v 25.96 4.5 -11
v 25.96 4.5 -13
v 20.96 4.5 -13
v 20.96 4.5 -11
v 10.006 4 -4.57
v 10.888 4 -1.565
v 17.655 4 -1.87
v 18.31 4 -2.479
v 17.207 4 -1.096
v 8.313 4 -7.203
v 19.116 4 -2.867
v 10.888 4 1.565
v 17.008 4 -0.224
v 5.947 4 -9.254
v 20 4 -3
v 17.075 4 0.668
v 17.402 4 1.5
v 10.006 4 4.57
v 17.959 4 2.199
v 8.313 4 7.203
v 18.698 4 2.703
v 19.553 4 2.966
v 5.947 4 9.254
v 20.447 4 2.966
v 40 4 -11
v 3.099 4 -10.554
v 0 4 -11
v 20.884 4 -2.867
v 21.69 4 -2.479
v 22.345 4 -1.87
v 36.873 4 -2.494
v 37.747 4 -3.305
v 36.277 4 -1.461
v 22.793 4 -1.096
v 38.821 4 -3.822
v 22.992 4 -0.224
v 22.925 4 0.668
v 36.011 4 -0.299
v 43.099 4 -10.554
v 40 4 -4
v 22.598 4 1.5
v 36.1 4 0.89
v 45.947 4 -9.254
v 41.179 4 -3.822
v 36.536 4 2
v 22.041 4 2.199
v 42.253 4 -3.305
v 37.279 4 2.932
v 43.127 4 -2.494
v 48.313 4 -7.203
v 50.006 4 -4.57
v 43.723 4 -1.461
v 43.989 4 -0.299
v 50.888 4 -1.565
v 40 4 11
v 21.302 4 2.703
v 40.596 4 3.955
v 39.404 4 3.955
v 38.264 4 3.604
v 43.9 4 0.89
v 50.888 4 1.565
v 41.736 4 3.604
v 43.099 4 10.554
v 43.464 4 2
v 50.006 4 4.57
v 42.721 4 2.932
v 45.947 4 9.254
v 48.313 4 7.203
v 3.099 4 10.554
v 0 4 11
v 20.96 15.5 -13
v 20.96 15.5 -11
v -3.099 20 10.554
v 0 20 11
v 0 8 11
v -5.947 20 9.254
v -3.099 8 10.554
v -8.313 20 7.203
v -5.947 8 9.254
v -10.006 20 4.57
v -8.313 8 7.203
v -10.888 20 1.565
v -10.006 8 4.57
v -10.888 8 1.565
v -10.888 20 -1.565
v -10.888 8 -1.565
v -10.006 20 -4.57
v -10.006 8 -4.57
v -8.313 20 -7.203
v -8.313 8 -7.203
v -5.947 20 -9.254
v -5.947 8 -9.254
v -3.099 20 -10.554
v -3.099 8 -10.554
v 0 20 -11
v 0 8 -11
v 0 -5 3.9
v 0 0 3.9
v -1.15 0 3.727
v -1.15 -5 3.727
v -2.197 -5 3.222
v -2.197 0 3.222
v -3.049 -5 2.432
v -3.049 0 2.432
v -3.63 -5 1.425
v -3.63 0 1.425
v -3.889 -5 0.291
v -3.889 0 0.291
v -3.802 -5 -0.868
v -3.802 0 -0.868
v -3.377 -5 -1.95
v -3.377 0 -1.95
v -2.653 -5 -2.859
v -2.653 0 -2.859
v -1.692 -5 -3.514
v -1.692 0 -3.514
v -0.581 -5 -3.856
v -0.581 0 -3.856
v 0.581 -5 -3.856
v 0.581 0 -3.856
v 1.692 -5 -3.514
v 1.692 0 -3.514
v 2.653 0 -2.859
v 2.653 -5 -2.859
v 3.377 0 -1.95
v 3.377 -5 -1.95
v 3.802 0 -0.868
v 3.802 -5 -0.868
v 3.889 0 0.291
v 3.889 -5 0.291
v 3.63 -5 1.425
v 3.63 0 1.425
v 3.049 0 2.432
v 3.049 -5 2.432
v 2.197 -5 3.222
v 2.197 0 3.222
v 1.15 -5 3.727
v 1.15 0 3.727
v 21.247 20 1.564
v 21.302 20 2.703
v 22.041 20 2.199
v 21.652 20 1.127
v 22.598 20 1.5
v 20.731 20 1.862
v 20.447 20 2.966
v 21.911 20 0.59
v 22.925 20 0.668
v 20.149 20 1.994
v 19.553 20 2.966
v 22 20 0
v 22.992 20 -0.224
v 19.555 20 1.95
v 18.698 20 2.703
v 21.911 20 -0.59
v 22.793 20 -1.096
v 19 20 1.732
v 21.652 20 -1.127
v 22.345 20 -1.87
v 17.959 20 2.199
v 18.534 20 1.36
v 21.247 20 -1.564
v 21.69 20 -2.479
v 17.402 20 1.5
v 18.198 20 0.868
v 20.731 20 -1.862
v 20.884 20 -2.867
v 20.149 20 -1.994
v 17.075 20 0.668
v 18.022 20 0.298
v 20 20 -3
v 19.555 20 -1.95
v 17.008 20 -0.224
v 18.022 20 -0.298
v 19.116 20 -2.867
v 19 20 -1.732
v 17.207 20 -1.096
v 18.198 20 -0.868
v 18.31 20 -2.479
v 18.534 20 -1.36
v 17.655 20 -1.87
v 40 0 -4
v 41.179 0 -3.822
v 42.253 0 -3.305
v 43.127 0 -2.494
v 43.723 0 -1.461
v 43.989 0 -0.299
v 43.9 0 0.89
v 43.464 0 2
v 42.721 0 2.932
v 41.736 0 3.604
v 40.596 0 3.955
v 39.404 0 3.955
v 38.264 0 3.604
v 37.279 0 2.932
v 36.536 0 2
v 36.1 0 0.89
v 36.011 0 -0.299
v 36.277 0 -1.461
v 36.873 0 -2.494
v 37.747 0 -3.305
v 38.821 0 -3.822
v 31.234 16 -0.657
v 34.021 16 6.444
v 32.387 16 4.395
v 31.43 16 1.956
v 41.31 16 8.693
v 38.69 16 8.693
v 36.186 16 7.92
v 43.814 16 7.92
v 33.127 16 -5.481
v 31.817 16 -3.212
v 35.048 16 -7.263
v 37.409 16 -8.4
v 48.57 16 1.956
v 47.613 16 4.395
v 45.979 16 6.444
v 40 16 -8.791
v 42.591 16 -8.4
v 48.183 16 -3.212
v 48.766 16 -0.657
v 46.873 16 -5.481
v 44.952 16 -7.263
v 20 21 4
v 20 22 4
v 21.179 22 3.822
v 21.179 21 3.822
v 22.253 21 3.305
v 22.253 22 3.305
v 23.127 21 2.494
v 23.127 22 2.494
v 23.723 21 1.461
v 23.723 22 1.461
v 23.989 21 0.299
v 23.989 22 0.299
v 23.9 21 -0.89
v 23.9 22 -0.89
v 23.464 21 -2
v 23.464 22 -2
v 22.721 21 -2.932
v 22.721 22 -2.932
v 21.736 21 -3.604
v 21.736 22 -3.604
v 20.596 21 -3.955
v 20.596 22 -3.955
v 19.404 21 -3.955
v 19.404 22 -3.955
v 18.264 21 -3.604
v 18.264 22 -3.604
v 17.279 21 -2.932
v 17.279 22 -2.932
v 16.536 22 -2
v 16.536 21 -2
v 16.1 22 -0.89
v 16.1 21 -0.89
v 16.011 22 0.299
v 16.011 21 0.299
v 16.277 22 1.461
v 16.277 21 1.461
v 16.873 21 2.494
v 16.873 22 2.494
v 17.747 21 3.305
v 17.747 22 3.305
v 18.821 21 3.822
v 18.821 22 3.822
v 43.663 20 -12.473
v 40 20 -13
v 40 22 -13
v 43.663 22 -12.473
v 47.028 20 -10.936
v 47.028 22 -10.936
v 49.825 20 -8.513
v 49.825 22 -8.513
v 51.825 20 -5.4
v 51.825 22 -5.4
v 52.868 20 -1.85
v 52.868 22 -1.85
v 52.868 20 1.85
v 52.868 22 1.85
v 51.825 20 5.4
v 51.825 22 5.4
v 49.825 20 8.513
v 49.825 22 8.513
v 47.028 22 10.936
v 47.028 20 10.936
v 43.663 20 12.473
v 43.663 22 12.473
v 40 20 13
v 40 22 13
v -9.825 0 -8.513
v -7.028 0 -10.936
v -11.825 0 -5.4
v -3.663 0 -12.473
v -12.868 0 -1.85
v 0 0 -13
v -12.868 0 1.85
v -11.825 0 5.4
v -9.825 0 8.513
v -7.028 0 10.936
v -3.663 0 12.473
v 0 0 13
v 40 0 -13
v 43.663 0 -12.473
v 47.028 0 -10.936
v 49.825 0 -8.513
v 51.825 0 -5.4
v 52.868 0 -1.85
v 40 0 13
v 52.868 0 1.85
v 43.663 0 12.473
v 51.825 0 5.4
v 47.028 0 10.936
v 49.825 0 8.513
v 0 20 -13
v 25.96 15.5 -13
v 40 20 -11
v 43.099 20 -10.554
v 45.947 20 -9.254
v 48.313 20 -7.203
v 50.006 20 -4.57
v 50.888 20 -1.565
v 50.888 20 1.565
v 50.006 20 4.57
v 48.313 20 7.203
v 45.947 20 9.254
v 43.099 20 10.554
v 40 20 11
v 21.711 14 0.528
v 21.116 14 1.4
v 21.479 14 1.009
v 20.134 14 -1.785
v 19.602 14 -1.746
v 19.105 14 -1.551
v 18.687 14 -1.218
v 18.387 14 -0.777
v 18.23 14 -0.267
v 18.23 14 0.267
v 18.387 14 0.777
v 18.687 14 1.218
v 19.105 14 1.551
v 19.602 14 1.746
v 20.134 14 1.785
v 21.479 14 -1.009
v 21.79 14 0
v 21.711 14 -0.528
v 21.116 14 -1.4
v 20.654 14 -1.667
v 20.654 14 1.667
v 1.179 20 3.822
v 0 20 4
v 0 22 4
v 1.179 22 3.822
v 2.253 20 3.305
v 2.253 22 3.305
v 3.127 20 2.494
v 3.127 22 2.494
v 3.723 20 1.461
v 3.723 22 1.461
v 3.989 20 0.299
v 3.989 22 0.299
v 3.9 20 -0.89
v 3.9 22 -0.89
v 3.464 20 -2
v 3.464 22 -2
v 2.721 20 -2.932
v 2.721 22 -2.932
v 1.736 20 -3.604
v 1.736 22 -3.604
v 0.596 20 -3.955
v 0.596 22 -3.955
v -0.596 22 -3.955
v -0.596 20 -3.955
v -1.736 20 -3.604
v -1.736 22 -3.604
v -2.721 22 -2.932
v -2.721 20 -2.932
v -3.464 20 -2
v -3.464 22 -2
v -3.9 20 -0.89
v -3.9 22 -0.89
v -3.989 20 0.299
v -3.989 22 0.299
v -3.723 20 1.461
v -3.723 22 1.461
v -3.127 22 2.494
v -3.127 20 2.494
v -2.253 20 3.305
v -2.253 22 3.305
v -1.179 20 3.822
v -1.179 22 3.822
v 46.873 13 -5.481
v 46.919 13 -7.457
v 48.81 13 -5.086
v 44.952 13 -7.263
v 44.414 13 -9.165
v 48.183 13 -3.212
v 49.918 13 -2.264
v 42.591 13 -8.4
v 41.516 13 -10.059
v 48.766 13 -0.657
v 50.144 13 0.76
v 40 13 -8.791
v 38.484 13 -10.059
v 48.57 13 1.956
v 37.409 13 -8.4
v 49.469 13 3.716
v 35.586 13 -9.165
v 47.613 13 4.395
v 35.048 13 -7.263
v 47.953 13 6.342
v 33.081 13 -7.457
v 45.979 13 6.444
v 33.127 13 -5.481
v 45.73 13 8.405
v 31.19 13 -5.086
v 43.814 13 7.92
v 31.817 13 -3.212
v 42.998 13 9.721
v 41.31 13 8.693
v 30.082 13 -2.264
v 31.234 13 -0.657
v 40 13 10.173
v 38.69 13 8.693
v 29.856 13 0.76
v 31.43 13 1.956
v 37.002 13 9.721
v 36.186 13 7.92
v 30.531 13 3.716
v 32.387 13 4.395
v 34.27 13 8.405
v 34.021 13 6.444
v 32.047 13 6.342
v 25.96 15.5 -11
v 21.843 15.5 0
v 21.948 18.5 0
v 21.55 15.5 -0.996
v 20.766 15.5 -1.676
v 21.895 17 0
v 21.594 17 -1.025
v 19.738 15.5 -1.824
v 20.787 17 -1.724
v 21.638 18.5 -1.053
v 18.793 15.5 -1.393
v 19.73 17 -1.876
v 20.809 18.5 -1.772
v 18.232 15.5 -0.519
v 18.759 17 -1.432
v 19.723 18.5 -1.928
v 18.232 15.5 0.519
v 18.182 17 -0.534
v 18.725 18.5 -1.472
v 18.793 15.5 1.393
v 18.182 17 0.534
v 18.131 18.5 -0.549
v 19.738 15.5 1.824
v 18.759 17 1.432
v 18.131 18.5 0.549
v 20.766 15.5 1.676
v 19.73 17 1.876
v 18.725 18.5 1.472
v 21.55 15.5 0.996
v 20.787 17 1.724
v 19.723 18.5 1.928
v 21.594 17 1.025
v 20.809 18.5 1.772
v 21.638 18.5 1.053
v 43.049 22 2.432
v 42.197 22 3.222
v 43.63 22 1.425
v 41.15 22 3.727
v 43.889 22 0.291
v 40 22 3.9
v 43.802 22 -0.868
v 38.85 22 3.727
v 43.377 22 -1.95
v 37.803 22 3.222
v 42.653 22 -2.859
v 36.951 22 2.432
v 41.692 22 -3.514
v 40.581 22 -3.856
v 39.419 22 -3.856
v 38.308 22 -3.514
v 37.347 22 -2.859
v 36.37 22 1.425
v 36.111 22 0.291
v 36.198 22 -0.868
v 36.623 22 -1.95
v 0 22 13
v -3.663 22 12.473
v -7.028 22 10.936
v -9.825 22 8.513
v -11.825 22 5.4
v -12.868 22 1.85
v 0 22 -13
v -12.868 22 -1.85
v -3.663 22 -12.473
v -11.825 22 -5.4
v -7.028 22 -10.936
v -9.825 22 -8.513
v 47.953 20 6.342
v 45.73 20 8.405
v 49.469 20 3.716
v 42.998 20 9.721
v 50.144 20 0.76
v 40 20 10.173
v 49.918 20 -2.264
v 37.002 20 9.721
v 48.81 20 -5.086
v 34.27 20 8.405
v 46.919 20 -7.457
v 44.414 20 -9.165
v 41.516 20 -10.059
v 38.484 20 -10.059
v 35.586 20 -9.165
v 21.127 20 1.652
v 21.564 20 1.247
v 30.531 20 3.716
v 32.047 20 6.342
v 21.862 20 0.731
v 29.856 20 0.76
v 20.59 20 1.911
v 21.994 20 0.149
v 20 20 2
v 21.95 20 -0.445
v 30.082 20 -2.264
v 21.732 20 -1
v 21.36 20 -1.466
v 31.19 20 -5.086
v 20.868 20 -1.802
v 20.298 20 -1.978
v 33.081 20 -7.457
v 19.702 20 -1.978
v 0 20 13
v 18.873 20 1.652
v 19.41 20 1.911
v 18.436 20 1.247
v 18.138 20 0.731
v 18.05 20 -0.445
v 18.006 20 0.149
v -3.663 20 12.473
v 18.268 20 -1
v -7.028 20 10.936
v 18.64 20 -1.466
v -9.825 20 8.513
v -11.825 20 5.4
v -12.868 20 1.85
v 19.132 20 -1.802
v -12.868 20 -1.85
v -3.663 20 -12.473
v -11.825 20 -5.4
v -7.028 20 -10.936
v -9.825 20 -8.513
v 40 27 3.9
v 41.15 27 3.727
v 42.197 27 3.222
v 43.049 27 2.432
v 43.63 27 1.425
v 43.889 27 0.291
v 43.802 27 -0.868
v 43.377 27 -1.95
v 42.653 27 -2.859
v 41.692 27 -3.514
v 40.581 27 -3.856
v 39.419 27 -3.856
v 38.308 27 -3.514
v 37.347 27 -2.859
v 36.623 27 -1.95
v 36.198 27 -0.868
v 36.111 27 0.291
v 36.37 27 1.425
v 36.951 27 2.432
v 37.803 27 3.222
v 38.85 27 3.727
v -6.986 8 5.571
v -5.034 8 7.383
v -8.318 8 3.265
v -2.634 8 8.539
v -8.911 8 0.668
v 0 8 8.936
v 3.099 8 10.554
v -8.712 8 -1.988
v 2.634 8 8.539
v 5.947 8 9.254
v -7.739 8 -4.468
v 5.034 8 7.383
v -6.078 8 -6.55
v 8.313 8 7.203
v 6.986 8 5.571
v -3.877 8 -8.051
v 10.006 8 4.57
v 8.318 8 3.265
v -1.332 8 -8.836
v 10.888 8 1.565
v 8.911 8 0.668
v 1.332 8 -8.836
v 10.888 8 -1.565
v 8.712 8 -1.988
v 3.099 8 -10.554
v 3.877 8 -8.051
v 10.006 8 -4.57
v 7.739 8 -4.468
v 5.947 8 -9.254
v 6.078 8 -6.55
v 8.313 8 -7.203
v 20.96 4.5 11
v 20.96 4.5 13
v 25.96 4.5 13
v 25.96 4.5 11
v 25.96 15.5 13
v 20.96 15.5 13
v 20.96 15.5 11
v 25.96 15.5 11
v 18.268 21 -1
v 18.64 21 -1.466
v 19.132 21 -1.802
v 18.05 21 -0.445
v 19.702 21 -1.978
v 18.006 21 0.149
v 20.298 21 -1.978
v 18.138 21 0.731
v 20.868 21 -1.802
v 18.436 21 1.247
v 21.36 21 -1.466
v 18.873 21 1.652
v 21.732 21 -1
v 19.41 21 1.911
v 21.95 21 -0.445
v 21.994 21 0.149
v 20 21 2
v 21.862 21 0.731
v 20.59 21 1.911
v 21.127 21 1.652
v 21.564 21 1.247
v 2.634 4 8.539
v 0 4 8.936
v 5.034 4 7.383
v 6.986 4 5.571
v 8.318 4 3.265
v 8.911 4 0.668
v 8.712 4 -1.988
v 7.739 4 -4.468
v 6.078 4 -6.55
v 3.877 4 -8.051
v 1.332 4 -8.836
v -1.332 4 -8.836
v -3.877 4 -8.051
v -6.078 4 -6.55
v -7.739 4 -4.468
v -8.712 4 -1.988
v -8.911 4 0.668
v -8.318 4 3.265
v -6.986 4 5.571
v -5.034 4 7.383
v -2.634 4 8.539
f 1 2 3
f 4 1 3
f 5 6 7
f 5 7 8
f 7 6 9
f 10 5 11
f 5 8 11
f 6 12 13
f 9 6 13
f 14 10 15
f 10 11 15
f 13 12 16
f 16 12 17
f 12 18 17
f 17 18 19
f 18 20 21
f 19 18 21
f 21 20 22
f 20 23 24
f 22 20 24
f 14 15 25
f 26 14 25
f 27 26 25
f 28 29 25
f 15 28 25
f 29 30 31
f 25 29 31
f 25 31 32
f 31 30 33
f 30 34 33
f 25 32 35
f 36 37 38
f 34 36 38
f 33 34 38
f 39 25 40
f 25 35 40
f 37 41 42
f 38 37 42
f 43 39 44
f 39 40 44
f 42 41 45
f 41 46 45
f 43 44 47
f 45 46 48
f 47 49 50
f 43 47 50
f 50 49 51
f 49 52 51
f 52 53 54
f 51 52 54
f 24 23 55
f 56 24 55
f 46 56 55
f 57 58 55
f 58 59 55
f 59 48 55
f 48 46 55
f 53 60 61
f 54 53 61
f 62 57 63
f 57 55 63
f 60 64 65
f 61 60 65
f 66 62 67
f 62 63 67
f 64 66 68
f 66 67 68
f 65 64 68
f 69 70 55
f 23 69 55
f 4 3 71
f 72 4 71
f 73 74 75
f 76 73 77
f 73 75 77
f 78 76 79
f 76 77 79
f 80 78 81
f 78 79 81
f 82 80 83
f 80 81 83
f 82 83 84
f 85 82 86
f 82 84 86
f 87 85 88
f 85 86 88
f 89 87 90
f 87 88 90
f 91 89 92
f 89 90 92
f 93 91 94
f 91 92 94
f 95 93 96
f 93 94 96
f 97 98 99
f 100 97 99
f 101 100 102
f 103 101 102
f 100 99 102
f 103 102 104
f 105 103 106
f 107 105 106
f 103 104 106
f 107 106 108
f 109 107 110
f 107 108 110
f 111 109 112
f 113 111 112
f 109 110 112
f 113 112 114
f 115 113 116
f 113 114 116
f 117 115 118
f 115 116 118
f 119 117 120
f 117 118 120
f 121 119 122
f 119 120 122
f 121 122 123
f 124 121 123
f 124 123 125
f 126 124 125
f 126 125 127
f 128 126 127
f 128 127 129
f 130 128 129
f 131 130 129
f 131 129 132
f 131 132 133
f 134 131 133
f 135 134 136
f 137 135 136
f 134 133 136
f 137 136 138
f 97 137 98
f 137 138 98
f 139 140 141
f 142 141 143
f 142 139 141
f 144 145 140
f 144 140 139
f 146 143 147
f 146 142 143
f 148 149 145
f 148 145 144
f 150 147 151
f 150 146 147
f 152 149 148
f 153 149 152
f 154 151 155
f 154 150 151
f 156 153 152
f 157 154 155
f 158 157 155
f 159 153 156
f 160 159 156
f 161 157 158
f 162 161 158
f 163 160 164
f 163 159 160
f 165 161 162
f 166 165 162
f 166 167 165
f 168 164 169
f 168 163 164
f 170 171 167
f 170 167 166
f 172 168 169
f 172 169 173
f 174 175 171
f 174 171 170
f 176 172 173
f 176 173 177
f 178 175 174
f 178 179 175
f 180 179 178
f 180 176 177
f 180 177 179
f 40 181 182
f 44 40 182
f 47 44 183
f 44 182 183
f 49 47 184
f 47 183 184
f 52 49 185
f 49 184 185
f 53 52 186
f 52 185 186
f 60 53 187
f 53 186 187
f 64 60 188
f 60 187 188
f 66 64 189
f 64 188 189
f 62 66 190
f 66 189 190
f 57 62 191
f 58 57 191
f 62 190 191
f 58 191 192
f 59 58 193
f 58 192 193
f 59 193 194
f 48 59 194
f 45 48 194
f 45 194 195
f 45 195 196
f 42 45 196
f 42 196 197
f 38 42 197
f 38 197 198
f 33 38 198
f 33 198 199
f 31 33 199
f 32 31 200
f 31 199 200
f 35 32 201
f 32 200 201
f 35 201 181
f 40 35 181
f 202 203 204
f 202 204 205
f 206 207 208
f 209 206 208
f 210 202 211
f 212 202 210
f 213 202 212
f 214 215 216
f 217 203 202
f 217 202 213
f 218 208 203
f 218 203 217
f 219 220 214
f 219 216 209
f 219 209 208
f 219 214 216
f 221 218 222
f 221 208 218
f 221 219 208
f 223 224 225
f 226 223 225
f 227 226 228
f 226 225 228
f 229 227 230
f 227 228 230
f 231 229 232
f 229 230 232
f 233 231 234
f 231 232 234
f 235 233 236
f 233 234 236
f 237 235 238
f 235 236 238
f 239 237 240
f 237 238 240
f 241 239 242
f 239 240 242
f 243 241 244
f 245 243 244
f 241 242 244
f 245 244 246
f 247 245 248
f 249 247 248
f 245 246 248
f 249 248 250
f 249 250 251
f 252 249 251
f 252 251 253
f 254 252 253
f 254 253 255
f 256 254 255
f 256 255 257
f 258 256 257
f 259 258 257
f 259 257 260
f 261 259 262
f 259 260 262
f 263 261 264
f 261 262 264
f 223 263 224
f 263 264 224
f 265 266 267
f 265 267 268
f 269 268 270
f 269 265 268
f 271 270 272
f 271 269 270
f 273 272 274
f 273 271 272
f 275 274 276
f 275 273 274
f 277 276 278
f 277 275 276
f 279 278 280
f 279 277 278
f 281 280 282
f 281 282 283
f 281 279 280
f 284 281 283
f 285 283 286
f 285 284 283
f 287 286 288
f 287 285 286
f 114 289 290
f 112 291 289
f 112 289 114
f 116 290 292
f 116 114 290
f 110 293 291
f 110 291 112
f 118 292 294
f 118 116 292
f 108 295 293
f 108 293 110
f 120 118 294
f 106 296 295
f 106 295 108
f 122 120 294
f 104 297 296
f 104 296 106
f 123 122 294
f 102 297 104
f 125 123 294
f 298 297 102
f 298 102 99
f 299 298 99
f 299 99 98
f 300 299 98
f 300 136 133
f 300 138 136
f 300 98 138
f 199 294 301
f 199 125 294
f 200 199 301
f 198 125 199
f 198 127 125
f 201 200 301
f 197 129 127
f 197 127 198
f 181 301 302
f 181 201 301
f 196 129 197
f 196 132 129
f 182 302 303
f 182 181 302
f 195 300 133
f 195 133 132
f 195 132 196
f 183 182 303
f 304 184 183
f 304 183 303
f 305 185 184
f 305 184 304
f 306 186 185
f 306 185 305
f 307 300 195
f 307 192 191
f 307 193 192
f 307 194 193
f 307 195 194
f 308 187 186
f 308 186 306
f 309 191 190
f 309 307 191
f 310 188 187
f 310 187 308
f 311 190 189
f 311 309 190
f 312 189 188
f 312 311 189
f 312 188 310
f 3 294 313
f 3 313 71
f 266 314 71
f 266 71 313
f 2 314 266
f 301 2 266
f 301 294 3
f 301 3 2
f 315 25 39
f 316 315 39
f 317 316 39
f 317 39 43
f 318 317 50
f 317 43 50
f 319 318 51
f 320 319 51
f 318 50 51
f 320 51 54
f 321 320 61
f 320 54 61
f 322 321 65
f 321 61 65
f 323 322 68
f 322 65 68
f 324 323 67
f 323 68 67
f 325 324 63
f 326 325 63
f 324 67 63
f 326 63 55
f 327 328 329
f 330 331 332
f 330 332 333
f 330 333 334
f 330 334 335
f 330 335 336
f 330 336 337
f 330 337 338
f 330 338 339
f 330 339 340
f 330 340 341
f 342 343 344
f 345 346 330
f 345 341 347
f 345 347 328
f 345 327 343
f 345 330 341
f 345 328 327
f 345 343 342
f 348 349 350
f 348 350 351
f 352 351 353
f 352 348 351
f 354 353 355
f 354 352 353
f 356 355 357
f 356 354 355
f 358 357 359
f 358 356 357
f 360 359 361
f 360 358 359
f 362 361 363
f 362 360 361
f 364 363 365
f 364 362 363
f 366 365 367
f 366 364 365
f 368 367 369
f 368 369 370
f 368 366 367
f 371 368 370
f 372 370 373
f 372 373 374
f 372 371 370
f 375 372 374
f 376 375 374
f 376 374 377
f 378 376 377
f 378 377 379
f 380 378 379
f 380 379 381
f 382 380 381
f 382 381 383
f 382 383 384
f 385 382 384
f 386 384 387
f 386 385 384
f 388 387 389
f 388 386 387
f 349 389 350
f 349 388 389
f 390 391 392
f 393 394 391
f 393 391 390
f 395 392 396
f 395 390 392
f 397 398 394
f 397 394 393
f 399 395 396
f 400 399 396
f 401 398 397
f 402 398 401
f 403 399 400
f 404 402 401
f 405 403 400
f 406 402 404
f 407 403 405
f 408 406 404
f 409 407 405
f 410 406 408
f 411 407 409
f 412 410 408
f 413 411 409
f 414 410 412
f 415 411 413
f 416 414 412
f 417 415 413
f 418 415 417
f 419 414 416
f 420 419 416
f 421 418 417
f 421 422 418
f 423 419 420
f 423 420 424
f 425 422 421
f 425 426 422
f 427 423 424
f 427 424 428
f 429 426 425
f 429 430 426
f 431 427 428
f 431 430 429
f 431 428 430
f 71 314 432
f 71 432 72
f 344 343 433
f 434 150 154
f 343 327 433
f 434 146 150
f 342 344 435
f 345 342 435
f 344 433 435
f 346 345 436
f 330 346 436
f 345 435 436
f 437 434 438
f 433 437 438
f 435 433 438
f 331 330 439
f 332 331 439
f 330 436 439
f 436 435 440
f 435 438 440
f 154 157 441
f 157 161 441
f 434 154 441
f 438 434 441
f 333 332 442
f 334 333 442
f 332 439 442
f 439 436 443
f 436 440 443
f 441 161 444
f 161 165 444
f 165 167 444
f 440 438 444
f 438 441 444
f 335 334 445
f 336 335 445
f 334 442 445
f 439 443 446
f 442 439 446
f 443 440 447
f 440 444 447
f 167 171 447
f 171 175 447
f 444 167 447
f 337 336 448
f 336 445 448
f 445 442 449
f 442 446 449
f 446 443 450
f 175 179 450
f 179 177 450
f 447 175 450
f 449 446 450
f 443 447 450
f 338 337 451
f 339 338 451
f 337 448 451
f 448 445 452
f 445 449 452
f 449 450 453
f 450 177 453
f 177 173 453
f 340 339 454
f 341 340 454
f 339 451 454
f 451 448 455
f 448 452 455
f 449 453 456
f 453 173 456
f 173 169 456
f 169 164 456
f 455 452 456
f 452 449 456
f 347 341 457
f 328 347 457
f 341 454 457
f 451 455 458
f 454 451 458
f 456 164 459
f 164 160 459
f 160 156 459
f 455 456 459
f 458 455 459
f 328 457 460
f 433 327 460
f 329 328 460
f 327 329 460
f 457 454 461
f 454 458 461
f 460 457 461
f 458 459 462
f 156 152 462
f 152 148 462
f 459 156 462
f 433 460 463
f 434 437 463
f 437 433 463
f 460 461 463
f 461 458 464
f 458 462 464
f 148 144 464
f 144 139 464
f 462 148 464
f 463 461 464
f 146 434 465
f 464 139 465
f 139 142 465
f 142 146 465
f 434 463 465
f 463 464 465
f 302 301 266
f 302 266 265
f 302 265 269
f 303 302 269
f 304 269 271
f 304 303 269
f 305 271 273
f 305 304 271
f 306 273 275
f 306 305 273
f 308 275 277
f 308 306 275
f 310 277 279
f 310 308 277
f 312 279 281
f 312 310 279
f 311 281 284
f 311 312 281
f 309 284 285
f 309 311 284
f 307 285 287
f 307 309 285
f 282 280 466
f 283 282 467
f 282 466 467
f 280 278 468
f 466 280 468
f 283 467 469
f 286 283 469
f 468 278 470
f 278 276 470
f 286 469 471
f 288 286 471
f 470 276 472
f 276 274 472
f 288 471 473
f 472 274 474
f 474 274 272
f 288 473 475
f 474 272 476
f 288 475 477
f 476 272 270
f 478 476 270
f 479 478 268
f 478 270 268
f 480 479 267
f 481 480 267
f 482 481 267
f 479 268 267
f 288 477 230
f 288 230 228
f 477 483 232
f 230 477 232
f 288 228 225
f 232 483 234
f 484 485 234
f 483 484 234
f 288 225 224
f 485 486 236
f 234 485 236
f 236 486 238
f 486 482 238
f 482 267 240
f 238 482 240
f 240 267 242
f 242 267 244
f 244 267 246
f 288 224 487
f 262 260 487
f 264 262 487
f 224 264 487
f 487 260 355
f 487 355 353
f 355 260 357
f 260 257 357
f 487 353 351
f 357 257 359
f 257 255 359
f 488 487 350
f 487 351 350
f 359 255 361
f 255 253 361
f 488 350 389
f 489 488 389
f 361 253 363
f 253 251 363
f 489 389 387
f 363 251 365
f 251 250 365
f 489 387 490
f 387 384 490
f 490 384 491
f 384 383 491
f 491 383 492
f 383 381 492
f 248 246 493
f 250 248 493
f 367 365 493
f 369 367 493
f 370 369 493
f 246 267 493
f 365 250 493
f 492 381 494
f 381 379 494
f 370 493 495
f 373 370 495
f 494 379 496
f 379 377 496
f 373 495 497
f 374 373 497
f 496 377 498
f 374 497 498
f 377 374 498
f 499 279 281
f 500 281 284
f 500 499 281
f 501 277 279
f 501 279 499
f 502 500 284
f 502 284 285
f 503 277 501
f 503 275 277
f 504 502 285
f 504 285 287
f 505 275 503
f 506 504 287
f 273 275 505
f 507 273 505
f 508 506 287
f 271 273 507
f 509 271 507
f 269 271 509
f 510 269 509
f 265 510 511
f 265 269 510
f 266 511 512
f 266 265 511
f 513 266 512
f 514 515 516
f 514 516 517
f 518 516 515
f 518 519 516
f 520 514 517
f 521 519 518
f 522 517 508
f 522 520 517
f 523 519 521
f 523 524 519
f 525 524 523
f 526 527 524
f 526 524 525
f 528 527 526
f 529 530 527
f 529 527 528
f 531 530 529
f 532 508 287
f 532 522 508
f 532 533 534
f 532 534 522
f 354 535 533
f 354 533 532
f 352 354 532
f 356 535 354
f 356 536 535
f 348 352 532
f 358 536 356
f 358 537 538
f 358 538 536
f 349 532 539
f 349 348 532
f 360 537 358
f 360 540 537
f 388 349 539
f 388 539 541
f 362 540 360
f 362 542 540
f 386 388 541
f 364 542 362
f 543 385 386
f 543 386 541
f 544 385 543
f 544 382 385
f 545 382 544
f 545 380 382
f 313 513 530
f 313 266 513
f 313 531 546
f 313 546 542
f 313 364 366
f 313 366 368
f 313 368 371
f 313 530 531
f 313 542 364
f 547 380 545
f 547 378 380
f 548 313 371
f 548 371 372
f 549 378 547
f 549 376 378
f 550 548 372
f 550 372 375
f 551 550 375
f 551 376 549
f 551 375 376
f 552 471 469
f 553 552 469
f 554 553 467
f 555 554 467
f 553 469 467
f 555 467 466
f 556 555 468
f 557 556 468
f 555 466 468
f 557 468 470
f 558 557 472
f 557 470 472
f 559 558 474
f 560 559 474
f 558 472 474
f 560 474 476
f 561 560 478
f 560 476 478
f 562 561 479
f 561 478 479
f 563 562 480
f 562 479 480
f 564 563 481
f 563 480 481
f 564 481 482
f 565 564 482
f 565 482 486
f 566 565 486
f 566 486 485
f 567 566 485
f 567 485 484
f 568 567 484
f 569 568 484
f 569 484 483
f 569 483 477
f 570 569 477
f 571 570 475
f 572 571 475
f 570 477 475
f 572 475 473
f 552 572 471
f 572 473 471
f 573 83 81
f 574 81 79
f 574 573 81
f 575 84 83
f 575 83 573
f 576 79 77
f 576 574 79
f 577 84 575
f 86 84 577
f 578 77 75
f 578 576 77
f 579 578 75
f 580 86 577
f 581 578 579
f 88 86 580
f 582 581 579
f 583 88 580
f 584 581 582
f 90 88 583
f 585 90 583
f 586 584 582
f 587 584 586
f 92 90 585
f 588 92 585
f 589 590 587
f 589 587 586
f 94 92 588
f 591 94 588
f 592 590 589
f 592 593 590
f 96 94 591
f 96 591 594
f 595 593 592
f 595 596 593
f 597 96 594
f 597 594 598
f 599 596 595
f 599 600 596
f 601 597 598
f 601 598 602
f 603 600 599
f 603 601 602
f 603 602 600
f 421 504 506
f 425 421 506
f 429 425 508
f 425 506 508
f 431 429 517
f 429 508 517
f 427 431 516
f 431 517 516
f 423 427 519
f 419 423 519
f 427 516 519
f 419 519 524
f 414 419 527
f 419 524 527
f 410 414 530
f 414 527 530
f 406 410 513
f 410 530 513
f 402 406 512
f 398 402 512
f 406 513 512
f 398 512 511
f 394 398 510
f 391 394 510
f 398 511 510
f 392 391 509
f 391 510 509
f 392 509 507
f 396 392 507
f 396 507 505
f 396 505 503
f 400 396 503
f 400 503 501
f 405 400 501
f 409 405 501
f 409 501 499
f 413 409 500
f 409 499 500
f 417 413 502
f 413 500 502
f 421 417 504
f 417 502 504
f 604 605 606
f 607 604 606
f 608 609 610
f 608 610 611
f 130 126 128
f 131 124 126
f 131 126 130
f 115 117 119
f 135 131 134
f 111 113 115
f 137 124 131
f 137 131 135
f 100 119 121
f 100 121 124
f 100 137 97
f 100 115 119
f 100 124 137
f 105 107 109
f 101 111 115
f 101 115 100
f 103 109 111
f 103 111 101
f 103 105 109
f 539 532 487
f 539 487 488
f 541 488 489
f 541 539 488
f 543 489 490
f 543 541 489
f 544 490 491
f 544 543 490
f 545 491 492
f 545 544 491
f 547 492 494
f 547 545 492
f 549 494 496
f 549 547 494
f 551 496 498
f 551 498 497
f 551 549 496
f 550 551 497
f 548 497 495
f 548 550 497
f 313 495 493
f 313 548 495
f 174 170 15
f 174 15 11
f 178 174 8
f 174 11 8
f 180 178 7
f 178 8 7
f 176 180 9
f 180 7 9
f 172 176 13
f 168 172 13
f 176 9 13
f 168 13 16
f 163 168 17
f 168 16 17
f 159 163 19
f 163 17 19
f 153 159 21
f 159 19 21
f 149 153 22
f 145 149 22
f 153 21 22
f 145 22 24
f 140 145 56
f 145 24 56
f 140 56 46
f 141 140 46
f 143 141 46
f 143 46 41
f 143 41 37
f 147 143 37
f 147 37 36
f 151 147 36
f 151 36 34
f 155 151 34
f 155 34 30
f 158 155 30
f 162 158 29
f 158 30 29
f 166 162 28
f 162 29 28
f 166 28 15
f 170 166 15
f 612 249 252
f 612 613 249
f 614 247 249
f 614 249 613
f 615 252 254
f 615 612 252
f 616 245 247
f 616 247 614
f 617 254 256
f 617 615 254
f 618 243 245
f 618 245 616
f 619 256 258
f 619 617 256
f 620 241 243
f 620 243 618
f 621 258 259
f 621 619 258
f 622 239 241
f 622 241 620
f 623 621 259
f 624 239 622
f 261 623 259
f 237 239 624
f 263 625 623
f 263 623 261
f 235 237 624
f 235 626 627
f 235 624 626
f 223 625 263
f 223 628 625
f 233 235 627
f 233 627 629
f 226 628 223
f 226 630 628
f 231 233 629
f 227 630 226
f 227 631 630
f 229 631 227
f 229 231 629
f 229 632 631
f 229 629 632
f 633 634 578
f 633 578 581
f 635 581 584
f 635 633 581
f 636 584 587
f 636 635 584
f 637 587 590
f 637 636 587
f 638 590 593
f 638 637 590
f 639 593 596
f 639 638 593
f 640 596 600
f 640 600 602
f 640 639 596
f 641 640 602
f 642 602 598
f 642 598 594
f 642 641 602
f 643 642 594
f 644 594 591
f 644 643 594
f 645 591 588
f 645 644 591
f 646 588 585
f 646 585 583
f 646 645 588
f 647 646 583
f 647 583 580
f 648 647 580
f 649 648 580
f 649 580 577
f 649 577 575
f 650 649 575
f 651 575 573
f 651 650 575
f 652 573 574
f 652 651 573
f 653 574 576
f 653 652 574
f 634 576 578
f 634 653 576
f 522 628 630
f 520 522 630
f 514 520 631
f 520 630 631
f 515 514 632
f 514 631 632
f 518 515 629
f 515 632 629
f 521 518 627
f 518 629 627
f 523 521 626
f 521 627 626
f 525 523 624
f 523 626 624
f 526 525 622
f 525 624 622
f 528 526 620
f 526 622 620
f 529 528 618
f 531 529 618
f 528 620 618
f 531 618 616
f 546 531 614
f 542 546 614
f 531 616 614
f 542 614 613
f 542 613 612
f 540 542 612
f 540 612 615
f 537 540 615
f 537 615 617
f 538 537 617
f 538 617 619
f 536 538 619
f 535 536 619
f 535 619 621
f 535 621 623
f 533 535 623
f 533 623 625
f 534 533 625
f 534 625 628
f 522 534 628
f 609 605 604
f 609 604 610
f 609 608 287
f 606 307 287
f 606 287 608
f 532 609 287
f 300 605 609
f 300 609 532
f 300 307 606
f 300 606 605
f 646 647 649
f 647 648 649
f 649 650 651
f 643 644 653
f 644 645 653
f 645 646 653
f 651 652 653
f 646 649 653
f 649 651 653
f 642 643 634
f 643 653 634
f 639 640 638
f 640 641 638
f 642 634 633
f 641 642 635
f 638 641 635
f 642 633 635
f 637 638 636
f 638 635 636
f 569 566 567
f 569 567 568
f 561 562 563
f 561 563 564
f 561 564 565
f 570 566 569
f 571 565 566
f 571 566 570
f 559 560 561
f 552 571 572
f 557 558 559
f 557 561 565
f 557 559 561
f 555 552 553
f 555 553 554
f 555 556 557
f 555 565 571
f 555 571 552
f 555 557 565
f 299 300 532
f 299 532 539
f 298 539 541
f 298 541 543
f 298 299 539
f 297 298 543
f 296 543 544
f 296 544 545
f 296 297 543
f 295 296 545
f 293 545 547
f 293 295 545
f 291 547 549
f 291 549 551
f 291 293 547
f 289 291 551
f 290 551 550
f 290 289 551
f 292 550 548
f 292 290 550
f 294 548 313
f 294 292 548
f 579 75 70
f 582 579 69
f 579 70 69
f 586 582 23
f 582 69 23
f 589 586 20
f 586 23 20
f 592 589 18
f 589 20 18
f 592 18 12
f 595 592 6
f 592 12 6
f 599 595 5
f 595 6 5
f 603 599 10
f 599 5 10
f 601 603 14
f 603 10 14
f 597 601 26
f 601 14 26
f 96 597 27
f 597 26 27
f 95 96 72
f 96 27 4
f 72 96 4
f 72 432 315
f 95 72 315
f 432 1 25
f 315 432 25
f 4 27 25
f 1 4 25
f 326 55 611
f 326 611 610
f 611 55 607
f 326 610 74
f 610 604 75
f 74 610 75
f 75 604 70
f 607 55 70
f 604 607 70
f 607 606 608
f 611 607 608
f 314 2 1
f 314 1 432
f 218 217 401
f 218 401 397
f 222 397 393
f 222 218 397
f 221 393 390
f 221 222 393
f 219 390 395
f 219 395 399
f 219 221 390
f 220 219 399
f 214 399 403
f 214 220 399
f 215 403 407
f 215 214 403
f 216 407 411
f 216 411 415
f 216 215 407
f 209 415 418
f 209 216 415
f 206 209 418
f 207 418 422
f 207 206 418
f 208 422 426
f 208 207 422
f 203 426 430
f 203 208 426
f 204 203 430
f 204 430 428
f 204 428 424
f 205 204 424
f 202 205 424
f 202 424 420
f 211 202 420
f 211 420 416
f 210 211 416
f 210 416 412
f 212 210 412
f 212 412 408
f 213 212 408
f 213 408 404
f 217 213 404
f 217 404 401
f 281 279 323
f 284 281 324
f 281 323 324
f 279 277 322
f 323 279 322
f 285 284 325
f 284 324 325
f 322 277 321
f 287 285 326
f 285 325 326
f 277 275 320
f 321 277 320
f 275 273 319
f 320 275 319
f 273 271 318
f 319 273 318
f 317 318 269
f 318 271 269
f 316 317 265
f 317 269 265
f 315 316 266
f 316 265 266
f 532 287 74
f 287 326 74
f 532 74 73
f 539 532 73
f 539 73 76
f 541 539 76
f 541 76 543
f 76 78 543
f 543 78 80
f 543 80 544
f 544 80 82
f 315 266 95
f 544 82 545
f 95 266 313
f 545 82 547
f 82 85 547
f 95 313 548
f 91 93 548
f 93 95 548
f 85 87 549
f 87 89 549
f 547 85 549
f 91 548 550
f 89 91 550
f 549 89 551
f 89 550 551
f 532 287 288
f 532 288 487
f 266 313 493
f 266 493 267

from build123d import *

# Parameters (mm, degrees)
BOSS_EXTRUDE1_DEPTH = 20
SKETCH2_R           = 4
BOSS_EXTRUDE2_DEPTH = 4
SKETCH3_R           = 11
SKETCH3_R_2         = 8.935764158
BOSS_EXTRUDE3_DEPTH = 4
SKETCH4_R           = 3
BOSS_EXTRUDE4_DEPTH = 16
SKETCH5_R           = 2
CUT_EXTRUDE1_DEPTH  = 6
CUT_EXTRUDE1_DRAFT  = -2
SKETCH6_R           = 4
BOSS_EXTRUDE5_DEPTH = 2
SKETCH7_R           = 2
CUT_EXTRUDE2_DEPTH  = 2
SKETCH8_R           = 4
CUT_EXTRUDE3_DEPTH  = 1
SKETCH9_R           = 10.172550013
SKETCH9_R_2         = 8.790782216
BOSS_EXTRUDE6_DEPTH = 7
SKETCH10_R          = 8.790782216
BOSS_EXTRUDE7_DEPTH = 4
SKETCH11_R          = 3.9
BOSS_EXTRUDE8_DEPTH = 5
SKETCH12_R          = 3.9
BOSS_EXTRUDE9_DEPTH = 5
SKETCH13_W          = 5
SKETCH13_H          = 11
CUT_EXTRUDE4_DEPTH  = 2
SKETCH14_W          = 5
SKETCH14_H          = 11
CUT_EXTRUDE5_DEPTH  = 2


with BuildPart() as part:
    # Sketch1 → Boss-Extrude1 (new body)
    with BuildSketch(Plane(origin=(0, 0, 0), x_dir=(1, 0, 0), z_dir=(0, 1, 0))):
        with BuildLine():
            Line((0, 13), (40, 13))
            ThreePointArc((40, 13), (53, 0), (40, -13))
            Line((40, -13), (0, -13))
            ThreePointArc((0, -13), (-13, 0), (0, 13))
        make_face()
        with BuildLine():
            Line((0, 11), (40, 11))
            ThreePointArc((40, 11), (51, 0), (40, -11))
            Line((40, -11), (0, -11))
            ThreePointArc((0, -11), (-11, 0), (0, 11))
        make_face(mode=Mode.SUBTRACT)
    extrude(amount=BOSS_EXTRUDE1_DEPTH)

    # Sketch2 → Boss-Extrude2 (add)
    with BuildSketch(Plane.XZ):
        with BuildLine():
            Line((20, 11), (0, 11))
            ThreePointArc((0, 11), (-11, 0), (0, -11))
            Line((0, -11), (20, -11))
            Line((20, -11), (40, -11))
            ThreePointArc((40, -11), (51, 0), (40, 11))
            Line((40, 11), (20, 11))
        make_face()
        with Locations(Location((40, 0, 0), (0, 0, 270))):
            Circle(SKETCH2_R, mode=Mode.SUBTRACT)
    extrude(amount=-BOSS_EXTRUDE2_DEPTH)

    # Sketch3 → Boss-Extrude3 (add)
    with BuildSketch(Plane(origin=(0, 4, 0), x_dir=(1, 0, 0), z_dir=(0, 1, 0))):
        Circle(SKETCH3_R)
        with Locations(Location((0, 0, 0), (0, 0, 270))):
            Circle(SKETCH3_R_2, mode=Mode.SUBTRACT)
    extrude(amount=BOSS_EXTRUDE3_DEPTH)

    # Sketch4 → Boss-Extrude4 (add)
    with BuildSketch(Plane(origin=(0, 4, 0), x_dir=(1, 0, 0), z_dir=(0, 1, 0))):
        with Locations(Location((20, 0, 0), (0, 0, 90))):
            Circle(SKETCH4_R)
    extrude(amount=BOSS_EXTRUDE4_DEPTH)


with BuildPart() as cut_extrude1_tool:
    # Sketch5 → Cut-Extrude1 (with draft: the straight prism first)
    with BuildSketch(Plane(origin=(0, 20, 0), x_dir=(1, 0, 0), z_dir=(0, 1, 0))):
        with Locations((20, 0)):
            Circle(SKETCH5_R)
    extrude(amount=-CUT_EXTRUDE1_DEPTH)
    # Cut-Extrude1: the draft: its side faces are tilted about the plane it starts from
    cut_extrude1_sides = [cut_extrude1_tool.faces().sort_by_distance(p)[0] for p in [
        (18, 17, 0),
    ]]
    draft(cut_extrude1_sides, Plane(origin=(0, 20, 0), x_dir=(1, 0, 0), z_dir=(0, 1, 0)), CUT_EXTRUDE1_DRAFT)


with BuildPart() as part_1:
    add(part.part)

    # Cut-Extrude1: cut by cut_extrude1_tool
    add(cut_extrude1_tool.part, mode=Mode.SUBTRACT)

    # Sketch11 → Boss-Extrude8 (add)
    with BuildSketch(Plane.XZ):
        with Locations(Location((0, 0, 0), (0, 0, 90))):
            Circle(SKETCH11_R)
    extrude(amount=BOSS_EXTRUDE8_DEPTH)

    # Sketch13 → Cut-Extrude4 (cut)
    with BuildSketch(Plane.XY.offset(13)):
        with Locations((23.459946743, 10)):
            Rectangle(SKETCH13_W, SKETCH13_H)
    extrude(amount=-CUT_EXTRUDE4_DEPTH, mode=Mode.SUBTRACT)

    # Sketch14 → Cut-Extrude5 (cut)
    with BuildSketch(Plane(origin=(0, 0, -13), x_dir=(-1, 0, 0), z_dir=(0, 0, -1))):
        with Locations((-23.459946743, 10)):
            Rectangle(SKETCH14_W, SKETCH14_H)
    extrude(amount=-CUT_EXTRUDE5_DEPTH, mode=Mode.SUBTRACT)


with BuildPart() as body_2:
    # Sketch6 → Boss-Extrude5 (new body)
    with BuildSketch(Plane(origin=(0, 20, 0), x_dir=(1, 0, 0), z_dir=(0, 1, 0))):
        with BuildLine():
            Line((0, 13), (40, 13))
            ThreePointArc((40, 13), (53, 0), (40, -13))
            Line((40, -13), (0, -13))
            ThreePointArc((0, -13), (-13, 0), (0, 13))
        make_face()
        with Locations(Location((0, 0, 0), (0, 0, 270))):
            Circle(SKETCH6_R, mode=Mode.SUBTRACT)
    extrude(amount=BOSS_EXTRUDE5_DEPTH)

    # Sketch7 → Cut-Extrude2 (cut)
    with BuildSketch(Plane(origin=(0, 22, 0), x_dir=(1, 0, 0), z_dir=(0, 1, 0))):
        with Locations(Location((20, 0, 0), (0, 0, 270))):
            Circle(SKETCH7_R)
    extrude(amount=-CUT_EXTRUDE2_DEPTH, mode=Mode.SUBTRACT)

    # Sketch8 → Cut-Extrude3 (cut)
    with BuildSketch(Plane(origin=(0, 22, 0), x_dir=(1, 0, 0), z_dir=(0, 1, 0))):
        with Locations(Location((20, 0, 0), (0, 0, 270))):
            Circle(SKETCH8_R)
    extrude(amount=-CUT_EXTRUDE3_DEPTH, mode=Mode.SUBTRACT)

    # Sketch9 → Boss-Extrude6 (add)
    with BuildSketch(Plane.XZ.offset(-20)):
        with Locations(Location((40, 0, 0), (0, 0, 90))):
            Circle(SKETCH9_R)
        with Locations(Location((40, 0, 0), (0, 0, 270))):
            Circle(SKETCH9_R_2, mode=Mode.SUBTRACT)
    extrude(amount=BOSS_EXTRUDE6_DEPTH)

    # Sketch10 → Boss-Extrude7 (add)
    with BuildSketch(Plane.XZ.offset(-20)):
        with Locations(Location((40, 0, 0), (0, 0, 270))):
            Circle(SKETCH10_R)
    extrude(amount=BOSS_EXTRUDE7_DEPTH)

    # Sketch12 → Boss-Extrude9 (add)
    with BuildSketch(Plane(origin=(0, 22, 0), x_dir=(1, 0, 0), z_dir=(0, 1, 0))):
        with Locations(Location((40, 0, 0), (0, 0, 270))):
            Circle(SKETCH12_R)
    extrude(amount=BOSS_EXTRUDE9_DEPTH)


solid = Compound([part_1.part, body_2.part])
